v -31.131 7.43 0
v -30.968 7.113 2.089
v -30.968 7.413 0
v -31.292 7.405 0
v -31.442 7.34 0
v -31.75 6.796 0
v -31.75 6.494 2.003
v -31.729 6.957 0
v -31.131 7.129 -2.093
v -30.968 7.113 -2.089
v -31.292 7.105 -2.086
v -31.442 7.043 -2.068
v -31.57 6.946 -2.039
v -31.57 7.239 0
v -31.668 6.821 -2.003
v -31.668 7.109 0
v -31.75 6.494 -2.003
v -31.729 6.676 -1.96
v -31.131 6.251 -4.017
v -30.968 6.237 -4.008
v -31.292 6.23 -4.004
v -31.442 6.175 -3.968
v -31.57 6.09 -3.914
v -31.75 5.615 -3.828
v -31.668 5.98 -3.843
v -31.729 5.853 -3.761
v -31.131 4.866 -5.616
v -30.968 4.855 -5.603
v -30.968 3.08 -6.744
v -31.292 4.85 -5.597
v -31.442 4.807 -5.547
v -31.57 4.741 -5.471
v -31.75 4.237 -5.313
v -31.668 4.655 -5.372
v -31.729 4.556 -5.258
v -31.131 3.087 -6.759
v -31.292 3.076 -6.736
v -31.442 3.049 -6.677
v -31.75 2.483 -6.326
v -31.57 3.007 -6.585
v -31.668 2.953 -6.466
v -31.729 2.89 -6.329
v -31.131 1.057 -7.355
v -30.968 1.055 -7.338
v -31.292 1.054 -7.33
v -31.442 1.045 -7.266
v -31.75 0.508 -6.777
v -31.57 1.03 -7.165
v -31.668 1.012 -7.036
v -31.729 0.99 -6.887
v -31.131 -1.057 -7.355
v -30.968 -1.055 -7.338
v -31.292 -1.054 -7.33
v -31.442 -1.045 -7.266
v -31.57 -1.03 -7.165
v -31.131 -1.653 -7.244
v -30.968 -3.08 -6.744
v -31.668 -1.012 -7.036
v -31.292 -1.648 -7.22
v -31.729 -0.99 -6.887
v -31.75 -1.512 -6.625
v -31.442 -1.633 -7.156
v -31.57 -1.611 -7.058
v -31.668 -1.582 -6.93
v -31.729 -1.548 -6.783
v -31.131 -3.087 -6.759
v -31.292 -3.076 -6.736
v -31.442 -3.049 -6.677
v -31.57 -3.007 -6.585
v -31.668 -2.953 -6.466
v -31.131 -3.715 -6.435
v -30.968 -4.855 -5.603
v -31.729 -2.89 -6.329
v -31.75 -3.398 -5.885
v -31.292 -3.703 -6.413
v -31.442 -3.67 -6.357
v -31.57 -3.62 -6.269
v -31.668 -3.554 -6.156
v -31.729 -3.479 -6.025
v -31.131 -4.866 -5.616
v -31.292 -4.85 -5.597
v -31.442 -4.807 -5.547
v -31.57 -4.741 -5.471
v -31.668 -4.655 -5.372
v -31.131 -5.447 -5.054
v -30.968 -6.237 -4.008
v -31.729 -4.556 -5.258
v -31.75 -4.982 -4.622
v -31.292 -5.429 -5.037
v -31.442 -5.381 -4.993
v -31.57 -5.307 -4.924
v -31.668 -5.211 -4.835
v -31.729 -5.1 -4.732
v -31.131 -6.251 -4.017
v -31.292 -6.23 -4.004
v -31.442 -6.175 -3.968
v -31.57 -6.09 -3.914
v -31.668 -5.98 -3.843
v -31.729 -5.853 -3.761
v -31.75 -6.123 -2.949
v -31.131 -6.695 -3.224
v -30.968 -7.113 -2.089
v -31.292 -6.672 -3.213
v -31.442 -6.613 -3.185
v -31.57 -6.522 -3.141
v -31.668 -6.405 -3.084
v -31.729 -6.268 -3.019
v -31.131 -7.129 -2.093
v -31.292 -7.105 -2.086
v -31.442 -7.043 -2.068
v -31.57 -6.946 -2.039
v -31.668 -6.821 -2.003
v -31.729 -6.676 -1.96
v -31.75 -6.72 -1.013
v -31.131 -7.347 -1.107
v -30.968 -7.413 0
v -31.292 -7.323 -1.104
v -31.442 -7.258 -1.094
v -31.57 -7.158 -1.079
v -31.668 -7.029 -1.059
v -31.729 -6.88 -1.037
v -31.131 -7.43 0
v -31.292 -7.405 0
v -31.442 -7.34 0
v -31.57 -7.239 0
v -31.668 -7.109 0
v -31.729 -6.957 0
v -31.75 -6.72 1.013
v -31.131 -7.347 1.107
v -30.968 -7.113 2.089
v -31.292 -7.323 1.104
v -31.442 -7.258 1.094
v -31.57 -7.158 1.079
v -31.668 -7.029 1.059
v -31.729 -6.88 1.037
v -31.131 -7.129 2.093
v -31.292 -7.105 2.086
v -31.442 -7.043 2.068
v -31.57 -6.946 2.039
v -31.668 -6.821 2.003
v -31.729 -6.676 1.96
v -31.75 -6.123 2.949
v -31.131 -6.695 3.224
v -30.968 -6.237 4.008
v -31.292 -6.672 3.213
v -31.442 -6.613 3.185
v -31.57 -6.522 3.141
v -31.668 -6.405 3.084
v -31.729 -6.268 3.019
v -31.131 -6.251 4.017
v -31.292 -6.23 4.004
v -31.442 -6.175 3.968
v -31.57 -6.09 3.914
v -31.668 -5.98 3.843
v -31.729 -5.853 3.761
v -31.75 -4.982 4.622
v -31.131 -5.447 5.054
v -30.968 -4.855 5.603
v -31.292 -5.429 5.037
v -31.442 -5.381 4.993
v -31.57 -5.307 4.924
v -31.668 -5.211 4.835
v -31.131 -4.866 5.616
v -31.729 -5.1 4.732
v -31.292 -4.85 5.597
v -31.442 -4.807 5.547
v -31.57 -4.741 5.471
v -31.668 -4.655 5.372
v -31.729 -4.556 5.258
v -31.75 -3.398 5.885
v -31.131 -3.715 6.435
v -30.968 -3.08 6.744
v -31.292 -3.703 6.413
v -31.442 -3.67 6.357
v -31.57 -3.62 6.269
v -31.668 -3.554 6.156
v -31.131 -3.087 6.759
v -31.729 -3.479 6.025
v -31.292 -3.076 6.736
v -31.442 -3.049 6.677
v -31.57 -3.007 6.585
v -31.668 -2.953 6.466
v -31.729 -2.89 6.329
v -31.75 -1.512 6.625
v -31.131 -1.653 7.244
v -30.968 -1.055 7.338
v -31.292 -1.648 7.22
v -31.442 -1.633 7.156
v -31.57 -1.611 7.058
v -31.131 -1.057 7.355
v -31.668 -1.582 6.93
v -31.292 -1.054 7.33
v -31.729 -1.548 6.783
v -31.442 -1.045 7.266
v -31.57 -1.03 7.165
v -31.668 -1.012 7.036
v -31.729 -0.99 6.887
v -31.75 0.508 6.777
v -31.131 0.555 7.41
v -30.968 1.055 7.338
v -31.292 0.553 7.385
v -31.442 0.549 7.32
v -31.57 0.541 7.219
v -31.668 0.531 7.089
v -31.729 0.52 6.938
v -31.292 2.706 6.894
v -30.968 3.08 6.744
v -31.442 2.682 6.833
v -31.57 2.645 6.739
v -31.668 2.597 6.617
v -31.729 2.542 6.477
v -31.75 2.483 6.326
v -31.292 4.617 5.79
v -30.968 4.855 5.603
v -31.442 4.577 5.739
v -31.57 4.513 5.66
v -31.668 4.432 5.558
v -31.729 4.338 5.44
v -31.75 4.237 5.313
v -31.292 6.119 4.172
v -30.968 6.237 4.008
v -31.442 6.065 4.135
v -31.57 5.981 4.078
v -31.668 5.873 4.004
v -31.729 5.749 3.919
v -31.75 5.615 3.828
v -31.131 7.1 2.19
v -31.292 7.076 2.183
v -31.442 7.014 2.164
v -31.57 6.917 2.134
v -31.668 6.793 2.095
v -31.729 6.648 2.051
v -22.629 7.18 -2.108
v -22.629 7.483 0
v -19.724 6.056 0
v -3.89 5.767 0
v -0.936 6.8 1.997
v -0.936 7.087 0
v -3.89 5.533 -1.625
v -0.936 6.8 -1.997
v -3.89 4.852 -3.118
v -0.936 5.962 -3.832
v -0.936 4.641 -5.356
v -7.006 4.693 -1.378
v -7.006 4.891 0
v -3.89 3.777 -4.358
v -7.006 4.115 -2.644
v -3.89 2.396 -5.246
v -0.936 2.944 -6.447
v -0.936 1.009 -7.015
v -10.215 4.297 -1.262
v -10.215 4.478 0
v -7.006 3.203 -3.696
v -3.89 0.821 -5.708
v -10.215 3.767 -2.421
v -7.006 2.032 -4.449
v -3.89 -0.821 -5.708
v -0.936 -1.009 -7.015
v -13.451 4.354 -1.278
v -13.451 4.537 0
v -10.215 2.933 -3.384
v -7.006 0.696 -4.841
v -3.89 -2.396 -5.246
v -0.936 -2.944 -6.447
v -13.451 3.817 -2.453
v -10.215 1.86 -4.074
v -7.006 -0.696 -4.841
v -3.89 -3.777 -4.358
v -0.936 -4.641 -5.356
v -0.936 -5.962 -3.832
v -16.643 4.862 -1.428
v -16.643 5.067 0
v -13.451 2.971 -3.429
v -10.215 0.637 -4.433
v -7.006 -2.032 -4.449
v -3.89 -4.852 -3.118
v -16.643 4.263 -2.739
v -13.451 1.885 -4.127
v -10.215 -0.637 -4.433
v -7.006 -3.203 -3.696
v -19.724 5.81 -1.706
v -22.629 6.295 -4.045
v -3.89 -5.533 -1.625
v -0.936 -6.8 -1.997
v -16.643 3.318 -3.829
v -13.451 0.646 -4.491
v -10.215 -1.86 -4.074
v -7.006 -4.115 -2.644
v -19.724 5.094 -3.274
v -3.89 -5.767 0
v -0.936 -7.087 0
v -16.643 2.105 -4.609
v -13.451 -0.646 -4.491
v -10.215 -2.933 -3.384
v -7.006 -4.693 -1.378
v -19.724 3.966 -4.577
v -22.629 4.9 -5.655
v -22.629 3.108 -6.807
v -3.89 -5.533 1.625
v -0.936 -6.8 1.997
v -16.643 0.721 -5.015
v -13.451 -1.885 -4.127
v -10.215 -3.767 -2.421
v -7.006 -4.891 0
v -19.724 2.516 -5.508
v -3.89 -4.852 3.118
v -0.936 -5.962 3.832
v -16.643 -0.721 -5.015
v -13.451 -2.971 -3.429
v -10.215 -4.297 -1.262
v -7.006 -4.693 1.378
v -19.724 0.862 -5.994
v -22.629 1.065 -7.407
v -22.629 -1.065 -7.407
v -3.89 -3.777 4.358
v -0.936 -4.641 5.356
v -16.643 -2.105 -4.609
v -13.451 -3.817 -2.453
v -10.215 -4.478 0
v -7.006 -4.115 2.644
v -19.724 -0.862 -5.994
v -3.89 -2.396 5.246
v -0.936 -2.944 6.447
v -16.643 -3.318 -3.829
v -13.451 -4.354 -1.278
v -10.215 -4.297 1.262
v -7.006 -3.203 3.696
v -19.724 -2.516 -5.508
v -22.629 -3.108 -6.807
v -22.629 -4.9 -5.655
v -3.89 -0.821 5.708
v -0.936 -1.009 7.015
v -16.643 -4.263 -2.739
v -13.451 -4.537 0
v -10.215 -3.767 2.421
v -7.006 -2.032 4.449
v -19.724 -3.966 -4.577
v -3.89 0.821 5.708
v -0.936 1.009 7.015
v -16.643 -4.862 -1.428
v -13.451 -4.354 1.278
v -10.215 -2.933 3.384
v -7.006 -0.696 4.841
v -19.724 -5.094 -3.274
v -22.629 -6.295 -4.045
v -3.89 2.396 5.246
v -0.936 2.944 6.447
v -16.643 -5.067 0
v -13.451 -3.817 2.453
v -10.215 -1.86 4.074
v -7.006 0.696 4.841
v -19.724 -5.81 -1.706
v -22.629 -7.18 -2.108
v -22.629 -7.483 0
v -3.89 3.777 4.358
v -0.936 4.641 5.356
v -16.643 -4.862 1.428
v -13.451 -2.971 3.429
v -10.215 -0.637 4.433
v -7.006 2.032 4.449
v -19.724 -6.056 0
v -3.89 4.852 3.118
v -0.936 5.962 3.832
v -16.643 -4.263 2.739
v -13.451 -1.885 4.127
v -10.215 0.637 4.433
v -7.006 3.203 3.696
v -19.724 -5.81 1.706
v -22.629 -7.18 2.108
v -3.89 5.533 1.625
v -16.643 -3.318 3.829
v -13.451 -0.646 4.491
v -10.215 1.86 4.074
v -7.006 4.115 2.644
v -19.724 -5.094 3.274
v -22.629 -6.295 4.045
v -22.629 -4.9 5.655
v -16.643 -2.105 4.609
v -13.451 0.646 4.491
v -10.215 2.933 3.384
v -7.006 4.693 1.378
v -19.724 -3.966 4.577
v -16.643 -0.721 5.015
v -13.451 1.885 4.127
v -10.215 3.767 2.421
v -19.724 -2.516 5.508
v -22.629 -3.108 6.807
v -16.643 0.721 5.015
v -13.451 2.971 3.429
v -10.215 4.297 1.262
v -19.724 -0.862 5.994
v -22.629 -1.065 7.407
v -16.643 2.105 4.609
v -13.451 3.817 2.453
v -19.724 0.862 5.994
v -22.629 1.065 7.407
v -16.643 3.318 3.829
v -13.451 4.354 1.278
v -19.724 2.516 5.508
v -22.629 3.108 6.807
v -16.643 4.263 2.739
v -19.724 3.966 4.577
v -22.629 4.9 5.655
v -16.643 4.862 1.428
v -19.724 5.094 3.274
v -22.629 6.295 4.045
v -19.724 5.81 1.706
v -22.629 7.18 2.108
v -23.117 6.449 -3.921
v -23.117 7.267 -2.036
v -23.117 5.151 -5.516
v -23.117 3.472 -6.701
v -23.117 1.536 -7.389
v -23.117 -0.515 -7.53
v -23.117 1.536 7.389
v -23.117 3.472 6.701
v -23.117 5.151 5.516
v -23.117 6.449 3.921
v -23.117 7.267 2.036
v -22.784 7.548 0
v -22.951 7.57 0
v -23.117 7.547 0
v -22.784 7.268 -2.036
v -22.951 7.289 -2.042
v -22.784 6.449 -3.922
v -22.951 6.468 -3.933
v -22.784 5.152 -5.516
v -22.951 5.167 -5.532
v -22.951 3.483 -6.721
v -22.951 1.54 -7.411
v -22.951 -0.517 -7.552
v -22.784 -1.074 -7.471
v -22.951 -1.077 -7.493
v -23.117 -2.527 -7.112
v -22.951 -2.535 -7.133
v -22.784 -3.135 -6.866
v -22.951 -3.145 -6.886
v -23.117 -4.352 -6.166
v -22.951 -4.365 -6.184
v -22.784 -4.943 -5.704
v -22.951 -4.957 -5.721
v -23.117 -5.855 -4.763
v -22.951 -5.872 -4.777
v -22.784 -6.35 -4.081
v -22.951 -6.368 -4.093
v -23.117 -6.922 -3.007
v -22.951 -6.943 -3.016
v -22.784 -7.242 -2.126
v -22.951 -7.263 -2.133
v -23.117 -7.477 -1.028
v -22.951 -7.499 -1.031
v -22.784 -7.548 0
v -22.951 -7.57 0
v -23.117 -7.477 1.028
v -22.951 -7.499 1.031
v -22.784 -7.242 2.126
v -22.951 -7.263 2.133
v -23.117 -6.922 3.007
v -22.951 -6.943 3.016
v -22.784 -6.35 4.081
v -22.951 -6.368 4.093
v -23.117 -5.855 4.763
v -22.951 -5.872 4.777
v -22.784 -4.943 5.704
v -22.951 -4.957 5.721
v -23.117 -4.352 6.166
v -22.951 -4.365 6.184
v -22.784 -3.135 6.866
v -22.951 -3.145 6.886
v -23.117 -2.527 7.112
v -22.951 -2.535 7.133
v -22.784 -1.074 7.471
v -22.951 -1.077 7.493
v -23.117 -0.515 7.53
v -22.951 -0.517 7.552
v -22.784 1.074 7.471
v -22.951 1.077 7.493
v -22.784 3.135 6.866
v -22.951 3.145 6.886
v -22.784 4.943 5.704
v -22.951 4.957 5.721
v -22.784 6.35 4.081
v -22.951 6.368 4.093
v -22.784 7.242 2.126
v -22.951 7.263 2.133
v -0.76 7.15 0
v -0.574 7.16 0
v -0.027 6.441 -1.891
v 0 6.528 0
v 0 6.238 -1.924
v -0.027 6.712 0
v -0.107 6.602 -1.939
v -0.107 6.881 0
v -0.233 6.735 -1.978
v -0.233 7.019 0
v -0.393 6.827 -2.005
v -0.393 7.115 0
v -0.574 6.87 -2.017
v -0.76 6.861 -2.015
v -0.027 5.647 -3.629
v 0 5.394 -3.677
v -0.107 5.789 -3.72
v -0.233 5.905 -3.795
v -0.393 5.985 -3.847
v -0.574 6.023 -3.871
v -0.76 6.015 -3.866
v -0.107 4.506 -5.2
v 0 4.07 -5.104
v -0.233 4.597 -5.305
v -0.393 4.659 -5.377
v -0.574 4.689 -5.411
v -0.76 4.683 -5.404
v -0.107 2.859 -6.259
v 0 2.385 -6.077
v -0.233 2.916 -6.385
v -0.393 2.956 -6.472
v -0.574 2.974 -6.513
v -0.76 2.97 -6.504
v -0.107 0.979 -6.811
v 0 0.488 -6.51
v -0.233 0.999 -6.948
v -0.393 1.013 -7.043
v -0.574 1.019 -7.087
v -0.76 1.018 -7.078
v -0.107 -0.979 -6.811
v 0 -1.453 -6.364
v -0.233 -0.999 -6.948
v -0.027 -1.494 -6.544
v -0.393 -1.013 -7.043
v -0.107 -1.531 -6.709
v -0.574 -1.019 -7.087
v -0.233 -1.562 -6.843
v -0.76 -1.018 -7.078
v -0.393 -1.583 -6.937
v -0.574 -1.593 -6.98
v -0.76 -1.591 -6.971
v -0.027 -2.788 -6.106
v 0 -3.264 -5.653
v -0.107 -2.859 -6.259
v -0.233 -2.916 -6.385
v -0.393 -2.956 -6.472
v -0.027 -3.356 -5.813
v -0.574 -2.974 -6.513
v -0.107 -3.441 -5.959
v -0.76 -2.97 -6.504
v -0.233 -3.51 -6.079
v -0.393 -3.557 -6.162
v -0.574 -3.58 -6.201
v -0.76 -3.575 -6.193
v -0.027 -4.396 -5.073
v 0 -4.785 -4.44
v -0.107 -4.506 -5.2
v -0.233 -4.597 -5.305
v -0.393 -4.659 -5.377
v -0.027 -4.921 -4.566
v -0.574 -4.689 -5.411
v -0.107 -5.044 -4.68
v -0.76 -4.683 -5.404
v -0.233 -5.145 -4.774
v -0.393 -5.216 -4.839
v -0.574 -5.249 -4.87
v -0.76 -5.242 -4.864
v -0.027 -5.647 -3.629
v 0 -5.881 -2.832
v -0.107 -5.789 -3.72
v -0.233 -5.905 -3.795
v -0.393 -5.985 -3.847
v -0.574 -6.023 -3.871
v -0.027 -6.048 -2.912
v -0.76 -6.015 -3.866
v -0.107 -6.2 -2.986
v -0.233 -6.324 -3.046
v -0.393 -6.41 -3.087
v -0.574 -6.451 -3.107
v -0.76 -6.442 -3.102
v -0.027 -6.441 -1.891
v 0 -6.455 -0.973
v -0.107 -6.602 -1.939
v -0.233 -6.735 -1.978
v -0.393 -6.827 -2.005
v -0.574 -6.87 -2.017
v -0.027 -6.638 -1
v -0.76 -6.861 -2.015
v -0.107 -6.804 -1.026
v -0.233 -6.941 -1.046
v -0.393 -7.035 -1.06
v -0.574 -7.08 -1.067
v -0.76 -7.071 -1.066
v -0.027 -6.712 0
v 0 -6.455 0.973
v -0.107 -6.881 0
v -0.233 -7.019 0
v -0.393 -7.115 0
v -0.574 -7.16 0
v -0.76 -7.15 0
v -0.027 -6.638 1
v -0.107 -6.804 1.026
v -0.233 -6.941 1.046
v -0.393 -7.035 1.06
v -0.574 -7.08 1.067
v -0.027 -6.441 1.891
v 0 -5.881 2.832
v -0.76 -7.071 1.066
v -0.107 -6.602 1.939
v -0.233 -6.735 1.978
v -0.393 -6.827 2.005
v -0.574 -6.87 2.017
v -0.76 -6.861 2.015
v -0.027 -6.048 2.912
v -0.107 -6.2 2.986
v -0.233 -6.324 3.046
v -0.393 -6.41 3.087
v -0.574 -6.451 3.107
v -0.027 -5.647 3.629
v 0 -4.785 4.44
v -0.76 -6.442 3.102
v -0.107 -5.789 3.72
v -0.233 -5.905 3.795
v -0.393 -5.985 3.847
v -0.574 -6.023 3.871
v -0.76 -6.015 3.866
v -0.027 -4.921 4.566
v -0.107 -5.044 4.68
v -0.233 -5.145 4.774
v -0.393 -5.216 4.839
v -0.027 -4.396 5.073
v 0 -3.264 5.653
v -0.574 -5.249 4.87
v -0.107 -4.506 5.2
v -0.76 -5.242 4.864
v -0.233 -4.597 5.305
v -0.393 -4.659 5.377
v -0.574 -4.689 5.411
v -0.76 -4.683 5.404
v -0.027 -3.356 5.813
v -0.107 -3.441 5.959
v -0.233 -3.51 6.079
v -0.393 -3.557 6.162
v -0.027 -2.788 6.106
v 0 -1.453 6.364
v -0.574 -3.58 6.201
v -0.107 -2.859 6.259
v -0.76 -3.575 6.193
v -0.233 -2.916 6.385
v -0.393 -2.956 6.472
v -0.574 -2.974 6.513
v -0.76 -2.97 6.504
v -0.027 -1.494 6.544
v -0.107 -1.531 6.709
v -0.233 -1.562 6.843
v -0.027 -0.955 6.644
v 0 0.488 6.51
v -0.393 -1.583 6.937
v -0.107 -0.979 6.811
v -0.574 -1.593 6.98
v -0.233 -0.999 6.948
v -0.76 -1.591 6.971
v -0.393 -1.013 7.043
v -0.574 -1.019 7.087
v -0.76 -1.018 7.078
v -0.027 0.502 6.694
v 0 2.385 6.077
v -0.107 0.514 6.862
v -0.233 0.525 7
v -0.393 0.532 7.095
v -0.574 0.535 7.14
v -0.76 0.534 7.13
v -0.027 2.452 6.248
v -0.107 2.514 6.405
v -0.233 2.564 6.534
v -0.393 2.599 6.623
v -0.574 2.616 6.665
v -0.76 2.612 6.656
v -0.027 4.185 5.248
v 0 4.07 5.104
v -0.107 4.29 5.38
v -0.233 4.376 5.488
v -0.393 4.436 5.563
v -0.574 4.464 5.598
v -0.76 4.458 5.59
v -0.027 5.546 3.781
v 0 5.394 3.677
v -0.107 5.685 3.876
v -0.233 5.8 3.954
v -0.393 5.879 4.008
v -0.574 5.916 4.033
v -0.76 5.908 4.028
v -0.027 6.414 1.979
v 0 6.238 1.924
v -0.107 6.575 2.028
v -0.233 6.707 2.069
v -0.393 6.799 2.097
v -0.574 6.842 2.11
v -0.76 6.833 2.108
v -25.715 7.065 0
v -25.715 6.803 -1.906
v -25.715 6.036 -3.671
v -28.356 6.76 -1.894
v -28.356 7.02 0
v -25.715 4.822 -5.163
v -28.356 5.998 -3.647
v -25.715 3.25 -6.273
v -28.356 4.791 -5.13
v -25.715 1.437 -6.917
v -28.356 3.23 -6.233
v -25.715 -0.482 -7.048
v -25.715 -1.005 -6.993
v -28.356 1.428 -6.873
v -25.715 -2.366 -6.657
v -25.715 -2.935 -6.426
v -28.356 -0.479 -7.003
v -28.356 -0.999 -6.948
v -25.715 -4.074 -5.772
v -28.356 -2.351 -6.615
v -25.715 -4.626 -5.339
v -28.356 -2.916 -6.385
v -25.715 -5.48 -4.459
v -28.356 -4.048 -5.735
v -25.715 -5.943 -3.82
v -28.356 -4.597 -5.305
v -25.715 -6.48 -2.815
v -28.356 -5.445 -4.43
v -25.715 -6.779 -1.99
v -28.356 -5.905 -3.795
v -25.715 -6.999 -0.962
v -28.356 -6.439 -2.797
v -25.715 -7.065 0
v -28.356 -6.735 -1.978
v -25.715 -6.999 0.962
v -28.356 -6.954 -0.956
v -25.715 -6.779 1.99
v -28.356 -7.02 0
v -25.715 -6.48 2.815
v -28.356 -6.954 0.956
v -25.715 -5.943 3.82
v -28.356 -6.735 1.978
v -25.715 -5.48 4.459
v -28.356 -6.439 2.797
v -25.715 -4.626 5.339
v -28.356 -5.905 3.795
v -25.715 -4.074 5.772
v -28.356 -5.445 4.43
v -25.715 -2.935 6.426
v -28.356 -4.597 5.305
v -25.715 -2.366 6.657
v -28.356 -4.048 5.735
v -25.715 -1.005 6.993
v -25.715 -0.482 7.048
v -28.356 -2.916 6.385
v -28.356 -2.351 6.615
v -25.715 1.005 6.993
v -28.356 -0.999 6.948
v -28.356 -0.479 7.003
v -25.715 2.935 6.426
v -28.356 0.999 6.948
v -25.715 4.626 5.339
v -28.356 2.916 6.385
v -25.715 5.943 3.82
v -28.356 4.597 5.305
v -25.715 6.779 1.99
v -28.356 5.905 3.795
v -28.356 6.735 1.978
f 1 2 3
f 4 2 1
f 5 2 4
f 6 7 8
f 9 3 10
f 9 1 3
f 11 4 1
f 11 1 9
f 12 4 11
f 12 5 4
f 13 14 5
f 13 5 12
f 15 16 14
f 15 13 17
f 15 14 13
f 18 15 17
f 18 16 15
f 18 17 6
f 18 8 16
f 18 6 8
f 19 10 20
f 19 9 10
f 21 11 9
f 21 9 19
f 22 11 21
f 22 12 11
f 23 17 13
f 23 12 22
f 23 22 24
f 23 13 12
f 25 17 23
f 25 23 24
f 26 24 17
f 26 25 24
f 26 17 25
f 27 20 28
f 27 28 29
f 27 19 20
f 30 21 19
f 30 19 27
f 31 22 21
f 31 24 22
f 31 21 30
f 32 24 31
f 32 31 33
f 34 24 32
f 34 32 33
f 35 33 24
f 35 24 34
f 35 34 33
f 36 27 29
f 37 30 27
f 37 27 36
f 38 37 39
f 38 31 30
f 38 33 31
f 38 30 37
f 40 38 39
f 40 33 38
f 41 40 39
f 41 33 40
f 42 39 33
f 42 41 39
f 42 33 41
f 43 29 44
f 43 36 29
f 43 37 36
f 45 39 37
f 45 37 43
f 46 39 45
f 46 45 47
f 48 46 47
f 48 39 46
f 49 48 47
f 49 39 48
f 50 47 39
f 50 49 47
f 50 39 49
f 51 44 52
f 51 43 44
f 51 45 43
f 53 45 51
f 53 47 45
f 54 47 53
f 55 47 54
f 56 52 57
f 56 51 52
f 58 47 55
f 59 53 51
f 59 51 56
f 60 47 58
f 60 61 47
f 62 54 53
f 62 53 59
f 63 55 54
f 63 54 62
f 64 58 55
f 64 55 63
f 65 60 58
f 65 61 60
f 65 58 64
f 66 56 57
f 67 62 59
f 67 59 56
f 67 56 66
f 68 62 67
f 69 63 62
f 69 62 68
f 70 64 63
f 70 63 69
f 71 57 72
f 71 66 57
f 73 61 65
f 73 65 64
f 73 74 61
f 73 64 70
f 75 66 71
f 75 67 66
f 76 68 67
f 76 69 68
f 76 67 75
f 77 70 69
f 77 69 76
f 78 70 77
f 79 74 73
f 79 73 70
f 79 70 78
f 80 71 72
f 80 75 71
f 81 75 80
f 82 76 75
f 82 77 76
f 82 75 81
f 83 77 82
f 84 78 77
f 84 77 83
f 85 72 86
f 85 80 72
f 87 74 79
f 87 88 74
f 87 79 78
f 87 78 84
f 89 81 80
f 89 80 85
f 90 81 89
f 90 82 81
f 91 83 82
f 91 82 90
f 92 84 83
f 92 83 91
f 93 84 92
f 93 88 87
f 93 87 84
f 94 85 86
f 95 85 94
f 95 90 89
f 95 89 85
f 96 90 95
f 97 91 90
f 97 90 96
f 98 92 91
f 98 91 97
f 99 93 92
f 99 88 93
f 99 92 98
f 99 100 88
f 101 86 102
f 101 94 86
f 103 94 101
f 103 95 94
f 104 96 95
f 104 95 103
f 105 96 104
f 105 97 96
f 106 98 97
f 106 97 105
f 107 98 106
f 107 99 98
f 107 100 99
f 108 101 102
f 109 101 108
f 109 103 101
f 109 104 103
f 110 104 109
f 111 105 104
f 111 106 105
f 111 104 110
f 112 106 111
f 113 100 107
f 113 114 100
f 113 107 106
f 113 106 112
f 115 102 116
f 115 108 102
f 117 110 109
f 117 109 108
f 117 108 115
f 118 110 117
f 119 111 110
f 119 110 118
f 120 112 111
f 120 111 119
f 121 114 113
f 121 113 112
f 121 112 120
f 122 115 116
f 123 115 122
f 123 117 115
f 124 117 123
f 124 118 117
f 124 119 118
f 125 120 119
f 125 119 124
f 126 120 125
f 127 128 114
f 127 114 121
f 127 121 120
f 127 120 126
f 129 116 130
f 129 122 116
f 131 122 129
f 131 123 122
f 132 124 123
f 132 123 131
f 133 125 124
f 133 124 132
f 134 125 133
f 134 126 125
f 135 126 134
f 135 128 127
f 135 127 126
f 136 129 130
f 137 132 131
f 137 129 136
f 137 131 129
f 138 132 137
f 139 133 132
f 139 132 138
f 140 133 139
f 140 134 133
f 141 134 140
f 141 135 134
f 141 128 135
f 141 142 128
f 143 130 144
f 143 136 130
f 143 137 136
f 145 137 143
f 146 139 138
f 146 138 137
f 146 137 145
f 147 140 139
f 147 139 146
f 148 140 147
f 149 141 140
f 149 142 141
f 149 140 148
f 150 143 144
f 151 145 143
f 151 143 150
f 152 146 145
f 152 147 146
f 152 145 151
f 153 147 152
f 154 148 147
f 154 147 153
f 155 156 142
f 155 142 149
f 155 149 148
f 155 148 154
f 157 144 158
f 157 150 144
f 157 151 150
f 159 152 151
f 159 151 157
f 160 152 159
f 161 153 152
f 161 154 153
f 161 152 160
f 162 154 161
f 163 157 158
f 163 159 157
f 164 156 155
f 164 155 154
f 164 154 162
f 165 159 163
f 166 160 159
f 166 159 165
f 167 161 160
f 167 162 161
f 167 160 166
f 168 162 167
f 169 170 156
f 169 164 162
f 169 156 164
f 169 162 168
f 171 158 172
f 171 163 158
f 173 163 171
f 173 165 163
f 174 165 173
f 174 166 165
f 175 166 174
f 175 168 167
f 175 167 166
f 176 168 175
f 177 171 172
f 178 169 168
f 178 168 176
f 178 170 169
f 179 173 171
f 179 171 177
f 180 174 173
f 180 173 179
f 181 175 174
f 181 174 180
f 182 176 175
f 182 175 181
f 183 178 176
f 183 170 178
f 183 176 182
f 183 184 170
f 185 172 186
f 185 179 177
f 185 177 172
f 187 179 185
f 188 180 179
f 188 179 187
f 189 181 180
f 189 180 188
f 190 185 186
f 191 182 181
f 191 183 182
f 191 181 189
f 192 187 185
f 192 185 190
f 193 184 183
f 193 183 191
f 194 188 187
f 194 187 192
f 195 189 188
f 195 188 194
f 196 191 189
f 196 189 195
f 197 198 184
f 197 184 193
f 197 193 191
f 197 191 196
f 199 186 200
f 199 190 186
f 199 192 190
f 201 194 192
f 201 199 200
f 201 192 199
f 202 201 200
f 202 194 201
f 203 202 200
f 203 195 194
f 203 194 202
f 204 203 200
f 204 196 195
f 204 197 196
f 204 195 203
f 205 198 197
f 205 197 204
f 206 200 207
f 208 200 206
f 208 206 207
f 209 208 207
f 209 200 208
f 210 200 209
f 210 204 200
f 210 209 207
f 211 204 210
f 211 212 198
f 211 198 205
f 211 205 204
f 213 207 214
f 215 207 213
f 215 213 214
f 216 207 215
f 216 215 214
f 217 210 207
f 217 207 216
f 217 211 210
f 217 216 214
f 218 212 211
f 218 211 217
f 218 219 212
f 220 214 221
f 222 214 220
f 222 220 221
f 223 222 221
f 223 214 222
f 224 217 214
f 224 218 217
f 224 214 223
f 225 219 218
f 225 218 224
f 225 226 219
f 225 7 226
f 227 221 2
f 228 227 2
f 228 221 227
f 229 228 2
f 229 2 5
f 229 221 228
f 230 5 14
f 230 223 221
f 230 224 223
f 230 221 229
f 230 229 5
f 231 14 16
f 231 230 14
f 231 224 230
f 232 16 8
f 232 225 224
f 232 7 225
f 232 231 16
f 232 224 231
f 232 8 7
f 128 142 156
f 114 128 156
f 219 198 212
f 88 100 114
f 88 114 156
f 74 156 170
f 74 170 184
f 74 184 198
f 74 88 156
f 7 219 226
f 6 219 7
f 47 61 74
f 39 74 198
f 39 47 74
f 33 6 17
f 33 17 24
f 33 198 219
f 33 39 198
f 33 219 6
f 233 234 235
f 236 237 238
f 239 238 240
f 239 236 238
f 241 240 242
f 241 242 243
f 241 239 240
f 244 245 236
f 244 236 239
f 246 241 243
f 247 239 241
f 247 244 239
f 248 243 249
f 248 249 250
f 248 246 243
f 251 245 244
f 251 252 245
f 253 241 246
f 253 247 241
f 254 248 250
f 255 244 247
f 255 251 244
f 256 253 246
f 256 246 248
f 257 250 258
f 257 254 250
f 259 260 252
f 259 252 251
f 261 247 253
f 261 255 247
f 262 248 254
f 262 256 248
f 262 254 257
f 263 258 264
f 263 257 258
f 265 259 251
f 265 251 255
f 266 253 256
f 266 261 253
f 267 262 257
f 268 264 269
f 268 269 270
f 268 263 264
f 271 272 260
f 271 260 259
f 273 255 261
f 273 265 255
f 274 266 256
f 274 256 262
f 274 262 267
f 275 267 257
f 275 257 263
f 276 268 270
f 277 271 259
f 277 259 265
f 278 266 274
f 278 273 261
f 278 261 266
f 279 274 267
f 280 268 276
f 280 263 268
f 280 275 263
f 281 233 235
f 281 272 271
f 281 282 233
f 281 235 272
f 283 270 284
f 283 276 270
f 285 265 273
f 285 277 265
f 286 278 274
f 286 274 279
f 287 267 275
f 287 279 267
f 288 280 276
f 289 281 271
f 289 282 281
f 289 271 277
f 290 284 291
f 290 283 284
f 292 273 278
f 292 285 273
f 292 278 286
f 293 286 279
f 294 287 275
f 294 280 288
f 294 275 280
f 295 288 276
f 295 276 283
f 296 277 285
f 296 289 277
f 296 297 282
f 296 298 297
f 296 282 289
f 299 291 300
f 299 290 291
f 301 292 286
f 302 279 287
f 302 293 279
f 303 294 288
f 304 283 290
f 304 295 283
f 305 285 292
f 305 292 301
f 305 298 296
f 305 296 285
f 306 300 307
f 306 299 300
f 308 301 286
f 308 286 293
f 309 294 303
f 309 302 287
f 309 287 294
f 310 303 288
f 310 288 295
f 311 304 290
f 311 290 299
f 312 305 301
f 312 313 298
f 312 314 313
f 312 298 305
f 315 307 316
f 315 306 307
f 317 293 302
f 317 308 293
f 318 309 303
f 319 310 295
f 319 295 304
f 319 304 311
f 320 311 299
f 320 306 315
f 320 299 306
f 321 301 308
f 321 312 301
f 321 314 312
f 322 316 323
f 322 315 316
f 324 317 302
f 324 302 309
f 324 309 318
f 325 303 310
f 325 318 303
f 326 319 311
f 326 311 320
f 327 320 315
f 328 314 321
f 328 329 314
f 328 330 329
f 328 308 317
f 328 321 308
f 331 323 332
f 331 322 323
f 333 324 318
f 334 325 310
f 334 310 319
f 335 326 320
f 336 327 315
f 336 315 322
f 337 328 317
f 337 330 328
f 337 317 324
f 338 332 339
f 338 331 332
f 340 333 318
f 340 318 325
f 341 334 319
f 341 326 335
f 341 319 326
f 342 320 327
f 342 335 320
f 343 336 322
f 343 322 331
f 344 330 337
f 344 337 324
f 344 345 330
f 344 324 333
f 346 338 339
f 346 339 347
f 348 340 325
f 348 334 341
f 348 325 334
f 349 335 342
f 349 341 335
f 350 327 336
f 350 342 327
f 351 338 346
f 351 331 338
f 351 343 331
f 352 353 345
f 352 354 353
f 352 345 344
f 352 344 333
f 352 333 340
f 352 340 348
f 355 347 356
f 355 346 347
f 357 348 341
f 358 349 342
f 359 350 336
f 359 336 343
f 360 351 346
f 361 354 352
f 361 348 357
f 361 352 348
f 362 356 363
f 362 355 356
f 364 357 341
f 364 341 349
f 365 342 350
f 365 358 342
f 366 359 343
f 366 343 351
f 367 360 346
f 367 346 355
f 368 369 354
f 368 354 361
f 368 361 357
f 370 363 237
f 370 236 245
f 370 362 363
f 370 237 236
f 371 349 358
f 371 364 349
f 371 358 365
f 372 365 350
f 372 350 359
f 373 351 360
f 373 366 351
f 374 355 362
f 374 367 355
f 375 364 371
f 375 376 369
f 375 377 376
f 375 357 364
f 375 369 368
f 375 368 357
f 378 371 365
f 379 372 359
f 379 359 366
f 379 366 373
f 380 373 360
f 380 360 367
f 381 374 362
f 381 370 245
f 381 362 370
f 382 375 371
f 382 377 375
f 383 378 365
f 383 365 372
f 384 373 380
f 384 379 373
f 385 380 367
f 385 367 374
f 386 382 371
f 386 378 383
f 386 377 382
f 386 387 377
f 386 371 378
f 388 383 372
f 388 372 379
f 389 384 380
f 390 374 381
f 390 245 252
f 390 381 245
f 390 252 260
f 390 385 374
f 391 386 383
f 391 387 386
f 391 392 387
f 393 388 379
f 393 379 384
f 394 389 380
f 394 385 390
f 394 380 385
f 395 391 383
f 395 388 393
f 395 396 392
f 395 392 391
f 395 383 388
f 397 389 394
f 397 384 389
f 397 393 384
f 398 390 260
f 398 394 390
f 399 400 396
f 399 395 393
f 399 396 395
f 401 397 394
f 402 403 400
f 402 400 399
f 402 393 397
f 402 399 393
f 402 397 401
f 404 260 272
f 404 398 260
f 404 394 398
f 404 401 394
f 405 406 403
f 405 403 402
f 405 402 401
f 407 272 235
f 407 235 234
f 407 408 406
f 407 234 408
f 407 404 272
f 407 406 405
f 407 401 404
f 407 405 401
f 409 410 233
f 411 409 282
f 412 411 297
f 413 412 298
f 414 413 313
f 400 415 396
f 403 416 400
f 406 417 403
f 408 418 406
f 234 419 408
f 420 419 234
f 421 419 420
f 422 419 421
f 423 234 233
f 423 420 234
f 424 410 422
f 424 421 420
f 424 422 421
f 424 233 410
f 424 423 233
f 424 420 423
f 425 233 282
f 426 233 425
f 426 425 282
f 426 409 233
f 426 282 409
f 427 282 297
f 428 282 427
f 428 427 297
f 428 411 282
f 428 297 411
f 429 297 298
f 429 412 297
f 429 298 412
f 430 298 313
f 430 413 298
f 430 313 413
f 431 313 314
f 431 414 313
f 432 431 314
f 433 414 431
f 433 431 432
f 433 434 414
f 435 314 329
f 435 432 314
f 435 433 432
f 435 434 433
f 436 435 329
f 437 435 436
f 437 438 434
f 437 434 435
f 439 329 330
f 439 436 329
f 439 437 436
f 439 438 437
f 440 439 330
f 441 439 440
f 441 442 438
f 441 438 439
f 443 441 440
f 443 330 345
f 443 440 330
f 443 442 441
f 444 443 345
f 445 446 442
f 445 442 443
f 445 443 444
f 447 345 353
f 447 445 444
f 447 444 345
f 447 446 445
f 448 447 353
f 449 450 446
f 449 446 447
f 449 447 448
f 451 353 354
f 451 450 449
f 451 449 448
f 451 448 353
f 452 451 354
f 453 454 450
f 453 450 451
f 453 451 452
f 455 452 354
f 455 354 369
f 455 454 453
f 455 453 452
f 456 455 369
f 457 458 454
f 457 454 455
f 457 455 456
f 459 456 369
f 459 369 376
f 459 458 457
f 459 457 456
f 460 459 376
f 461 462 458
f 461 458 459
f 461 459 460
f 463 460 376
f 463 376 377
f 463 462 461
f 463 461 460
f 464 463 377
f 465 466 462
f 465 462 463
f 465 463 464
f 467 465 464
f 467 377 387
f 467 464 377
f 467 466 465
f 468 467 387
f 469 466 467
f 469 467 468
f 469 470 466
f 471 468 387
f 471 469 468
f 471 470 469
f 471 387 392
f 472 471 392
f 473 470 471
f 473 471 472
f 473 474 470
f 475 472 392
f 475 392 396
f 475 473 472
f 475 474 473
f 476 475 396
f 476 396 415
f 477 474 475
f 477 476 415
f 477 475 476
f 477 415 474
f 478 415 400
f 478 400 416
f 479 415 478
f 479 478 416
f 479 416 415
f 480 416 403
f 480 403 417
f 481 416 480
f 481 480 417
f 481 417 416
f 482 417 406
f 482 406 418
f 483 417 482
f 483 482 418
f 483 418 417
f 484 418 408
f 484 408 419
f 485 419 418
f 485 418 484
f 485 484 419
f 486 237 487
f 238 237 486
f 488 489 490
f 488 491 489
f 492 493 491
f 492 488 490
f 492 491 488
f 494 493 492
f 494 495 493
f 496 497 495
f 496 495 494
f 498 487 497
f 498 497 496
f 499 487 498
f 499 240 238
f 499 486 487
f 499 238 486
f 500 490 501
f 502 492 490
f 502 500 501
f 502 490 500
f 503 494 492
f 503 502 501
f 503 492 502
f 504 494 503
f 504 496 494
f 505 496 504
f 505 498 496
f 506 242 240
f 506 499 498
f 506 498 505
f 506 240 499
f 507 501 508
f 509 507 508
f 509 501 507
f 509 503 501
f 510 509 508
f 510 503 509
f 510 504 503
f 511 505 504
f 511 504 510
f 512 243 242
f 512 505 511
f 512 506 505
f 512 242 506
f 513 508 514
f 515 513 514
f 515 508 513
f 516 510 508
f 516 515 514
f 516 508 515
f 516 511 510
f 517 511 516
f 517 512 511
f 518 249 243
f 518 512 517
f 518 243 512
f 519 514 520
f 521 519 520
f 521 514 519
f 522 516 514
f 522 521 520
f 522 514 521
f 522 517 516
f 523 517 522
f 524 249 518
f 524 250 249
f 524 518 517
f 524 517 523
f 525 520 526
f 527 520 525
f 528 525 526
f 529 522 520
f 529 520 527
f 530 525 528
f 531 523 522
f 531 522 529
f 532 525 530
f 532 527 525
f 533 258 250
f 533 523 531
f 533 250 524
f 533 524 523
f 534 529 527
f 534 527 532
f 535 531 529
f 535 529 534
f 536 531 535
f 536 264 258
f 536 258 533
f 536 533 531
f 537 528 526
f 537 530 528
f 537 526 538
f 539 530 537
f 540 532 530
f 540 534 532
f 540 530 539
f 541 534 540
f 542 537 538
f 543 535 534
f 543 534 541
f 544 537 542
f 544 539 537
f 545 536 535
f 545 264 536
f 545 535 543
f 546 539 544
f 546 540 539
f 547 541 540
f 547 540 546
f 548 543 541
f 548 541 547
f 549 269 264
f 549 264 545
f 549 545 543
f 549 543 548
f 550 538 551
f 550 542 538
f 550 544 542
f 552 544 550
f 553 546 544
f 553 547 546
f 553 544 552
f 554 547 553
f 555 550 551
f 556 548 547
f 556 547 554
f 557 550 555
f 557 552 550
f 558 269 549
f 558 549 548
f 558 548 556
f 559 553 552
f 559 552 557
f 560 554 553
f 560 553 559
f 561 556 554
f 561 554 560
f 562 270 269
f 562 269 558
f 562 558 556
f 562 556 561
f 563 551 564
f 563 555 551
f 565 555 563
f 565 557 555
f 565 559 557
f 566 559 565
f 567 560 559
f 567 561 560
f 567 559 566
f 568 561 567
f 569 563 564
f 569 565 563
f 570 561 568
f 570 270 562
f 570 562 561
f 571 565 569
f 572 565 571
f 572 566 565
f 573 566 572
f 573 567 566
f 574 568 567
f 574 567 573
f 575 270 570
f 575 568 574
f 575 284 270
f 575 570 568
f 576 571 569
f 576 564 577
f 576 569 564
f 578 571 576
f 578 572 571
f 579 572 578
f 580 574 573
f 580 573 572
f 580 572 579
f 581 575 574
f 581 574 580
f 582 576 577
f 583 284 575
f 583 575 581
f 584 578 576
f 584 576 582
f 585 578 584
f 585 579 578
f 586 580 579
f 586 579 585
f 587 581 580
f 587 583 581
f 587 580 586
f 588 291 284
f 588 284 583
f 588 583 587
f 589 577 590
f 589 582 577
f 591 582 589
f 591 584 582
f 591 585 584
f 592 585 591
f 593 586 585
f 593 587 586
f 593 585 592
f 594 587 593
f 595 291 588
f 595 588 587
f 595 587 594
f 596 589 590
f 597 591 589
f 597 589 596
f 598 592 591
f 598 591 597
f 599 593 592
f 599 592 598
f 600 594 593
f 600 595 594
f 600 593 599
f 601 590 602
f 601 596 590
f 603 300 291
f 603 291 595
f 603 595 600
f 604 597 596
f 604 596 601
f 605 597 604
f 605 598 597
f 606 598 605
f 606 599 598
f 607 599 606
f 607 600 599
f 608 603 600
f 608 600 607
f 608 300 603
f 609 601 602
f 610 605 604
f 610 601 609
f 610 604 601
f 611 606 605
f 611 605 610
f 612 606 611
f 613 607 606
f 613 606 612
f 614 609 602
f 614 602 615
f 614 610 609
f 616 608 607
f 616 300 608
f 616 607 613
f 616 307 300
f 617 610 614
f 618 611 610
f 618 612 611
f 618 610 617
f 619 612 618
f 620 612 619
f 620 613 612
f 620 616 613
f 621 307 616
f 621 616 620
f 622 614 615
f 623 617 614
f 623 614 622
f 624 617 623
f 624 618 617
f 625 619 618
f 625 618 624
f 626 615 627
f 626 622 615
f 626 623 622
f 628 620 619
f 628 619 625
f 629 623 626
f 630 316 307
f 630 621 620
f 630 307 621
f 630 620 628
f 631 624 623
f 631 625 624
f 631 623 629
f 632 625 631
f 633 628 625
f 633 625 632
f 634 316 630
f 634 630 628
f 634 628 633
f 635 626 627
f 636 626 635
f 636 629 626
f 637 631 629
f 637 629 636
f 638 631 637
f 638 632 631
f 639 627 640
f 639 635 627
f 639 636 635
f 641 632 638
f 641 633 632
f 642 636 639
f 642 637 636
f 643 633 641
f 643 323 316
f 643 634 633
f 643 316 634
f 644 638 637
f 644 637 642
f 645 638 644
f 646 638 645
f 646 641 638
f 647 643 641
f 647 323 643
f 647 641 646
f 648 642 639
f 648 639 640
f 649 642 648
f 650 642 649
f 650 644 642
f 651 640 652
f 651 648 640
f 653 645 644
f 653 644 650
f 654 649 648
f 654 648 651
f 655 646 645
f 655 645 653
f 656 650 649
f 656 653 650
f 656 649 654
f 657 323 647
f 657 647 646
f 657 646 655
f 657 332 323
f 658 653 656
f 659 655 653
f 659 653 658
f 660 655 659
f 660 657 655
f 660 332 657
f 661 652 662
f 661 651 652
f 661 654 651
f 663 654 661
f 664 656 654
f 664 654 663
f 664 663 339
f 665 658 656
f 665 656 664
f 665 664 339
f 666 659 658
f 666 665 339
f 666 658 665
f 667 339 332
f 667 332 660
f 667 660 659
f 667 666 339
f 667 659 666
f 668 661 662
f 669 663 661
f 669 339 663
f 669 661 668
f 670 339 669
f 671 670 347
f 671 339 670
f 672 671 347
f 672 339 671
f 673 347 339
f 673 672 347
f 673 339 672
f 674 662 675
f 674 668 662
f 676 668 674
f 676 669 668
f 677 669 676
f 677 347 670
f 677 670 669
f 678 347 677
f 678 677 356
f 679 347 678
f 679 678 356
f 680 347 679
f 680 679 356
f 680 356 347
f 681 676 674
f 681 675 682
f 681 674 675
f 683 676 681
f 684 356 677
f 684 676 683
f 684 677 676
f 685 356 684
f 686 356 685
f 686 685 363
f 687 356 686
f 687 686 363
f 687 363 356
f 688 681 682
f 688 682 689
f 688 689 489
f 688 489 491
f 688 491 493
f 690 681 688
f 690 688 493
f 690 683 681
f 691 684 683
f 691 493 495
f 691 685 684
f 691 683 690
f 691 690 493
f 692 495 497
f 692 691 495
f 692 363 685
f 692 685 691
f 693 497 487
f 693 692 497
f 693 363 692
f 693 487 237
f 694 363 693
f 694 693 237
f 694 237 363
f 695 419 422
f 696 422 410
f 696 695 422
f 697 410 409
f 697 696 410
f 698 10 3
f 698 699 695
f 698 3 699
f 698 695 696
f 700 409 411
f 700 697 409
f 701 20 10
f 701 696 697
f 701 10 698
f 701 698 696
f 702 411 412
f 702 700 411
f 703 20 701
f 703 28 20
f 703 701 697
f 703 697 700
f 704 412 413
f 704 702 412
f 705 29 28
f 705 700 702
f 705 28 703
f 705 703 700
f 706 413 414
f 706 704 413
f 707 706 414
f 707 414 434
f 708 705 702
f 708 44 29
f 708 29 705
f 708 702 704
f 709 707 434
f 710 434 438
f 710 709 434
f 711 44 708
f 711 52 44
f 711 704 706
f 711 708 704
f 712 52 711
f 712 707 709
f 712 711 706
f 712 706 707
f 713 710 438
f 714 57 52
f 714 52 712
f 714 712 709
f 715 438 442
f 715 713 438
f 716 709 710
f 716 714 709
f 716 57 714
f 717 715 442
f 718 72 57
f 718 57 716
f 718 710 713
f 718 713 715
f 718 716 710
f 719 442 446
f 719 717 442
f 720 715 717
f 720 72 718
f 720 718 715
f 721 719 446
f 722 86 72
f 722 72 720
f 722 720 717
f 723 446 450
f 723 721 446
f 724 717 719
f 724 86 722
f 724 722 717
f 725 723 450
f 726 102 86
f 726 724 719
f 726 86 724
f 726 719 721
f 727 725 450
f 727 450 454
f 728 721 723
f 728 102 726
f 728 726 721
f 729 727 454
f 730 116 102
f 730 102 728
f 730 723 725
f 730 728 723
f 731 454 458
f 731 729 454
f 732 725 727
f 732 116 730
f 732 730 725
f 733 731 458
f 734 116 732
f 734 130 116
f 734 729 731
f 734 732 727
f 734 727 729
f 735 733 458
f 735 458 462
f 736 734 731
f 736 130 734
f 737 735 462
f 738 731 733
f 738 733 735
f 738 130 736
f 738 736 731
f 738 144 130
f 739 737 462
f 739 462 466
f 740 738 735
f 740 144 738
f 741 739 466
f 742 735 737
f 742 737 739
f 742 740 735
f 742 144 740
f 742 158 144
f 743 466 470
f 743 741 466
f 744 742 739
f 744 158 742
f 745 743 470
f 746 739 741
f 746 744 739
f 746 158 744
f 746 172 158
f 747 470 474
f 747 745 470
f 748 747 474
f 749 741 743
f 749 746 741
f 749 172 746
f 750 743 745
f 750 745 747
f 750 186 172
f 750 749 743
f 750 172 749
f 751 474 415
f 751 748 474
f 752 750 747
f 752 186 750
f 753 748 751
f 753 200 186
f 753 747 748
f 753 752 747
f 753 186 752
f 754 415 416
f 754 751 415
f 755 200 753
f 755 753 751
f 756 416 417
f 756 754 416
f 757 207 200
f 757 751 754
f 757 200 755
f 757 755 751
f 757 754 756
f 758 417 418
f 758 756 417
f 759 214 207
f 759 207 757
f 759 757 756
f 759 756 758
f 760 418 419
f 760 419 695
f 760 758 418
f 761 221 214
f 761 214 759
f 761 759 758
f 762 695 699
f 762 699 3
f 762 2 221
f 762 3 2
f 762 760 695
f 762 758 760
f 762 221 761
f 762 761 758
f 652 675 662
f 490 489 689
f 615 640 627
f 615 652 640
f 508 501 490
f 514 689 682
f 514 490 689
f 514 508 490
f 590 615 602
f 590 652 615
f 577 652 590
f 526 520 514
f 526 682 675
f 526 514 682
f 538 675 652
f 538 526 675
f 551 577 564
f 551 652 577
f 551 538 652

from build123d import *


with BuildPart() as f1:
    # F0 (on Top) → F1 (revolve)
    with BuildSketch(Plane.XY):
        with BuildLine():
            Line((-31.75, 0), (0, 0))
            Line((0, 0), (0, 6.527945))
            ThreePointArc((0, 6.527945), (-0.309207, 7.072998), (-0.935696, 7.087236))
            ThreePointArc((-0.935696, 7.087236), (-11.833996, 4.448683), (-22.628869, 7.48276))
            ThreePointArc((-22.628869, 7.48276), (-22.866551, 7.564328), (-23.117263, 7.54731))
            ThreePointArc((-23.117263, 7.54731), (-27.034458, 6.987305), (-30.968462, 7.41349))
            ThreePointArc((-30.968462, 7.41349), (-31.50881, 7.293764), (-31.75, 6.795629))
            Line((-31.75, 6.795629), (-31.75, 0))
        make_face()
    revolve(axis=Axis((-15.875, 0, 0), (-1, 0, 0)))


solid = f1.part
